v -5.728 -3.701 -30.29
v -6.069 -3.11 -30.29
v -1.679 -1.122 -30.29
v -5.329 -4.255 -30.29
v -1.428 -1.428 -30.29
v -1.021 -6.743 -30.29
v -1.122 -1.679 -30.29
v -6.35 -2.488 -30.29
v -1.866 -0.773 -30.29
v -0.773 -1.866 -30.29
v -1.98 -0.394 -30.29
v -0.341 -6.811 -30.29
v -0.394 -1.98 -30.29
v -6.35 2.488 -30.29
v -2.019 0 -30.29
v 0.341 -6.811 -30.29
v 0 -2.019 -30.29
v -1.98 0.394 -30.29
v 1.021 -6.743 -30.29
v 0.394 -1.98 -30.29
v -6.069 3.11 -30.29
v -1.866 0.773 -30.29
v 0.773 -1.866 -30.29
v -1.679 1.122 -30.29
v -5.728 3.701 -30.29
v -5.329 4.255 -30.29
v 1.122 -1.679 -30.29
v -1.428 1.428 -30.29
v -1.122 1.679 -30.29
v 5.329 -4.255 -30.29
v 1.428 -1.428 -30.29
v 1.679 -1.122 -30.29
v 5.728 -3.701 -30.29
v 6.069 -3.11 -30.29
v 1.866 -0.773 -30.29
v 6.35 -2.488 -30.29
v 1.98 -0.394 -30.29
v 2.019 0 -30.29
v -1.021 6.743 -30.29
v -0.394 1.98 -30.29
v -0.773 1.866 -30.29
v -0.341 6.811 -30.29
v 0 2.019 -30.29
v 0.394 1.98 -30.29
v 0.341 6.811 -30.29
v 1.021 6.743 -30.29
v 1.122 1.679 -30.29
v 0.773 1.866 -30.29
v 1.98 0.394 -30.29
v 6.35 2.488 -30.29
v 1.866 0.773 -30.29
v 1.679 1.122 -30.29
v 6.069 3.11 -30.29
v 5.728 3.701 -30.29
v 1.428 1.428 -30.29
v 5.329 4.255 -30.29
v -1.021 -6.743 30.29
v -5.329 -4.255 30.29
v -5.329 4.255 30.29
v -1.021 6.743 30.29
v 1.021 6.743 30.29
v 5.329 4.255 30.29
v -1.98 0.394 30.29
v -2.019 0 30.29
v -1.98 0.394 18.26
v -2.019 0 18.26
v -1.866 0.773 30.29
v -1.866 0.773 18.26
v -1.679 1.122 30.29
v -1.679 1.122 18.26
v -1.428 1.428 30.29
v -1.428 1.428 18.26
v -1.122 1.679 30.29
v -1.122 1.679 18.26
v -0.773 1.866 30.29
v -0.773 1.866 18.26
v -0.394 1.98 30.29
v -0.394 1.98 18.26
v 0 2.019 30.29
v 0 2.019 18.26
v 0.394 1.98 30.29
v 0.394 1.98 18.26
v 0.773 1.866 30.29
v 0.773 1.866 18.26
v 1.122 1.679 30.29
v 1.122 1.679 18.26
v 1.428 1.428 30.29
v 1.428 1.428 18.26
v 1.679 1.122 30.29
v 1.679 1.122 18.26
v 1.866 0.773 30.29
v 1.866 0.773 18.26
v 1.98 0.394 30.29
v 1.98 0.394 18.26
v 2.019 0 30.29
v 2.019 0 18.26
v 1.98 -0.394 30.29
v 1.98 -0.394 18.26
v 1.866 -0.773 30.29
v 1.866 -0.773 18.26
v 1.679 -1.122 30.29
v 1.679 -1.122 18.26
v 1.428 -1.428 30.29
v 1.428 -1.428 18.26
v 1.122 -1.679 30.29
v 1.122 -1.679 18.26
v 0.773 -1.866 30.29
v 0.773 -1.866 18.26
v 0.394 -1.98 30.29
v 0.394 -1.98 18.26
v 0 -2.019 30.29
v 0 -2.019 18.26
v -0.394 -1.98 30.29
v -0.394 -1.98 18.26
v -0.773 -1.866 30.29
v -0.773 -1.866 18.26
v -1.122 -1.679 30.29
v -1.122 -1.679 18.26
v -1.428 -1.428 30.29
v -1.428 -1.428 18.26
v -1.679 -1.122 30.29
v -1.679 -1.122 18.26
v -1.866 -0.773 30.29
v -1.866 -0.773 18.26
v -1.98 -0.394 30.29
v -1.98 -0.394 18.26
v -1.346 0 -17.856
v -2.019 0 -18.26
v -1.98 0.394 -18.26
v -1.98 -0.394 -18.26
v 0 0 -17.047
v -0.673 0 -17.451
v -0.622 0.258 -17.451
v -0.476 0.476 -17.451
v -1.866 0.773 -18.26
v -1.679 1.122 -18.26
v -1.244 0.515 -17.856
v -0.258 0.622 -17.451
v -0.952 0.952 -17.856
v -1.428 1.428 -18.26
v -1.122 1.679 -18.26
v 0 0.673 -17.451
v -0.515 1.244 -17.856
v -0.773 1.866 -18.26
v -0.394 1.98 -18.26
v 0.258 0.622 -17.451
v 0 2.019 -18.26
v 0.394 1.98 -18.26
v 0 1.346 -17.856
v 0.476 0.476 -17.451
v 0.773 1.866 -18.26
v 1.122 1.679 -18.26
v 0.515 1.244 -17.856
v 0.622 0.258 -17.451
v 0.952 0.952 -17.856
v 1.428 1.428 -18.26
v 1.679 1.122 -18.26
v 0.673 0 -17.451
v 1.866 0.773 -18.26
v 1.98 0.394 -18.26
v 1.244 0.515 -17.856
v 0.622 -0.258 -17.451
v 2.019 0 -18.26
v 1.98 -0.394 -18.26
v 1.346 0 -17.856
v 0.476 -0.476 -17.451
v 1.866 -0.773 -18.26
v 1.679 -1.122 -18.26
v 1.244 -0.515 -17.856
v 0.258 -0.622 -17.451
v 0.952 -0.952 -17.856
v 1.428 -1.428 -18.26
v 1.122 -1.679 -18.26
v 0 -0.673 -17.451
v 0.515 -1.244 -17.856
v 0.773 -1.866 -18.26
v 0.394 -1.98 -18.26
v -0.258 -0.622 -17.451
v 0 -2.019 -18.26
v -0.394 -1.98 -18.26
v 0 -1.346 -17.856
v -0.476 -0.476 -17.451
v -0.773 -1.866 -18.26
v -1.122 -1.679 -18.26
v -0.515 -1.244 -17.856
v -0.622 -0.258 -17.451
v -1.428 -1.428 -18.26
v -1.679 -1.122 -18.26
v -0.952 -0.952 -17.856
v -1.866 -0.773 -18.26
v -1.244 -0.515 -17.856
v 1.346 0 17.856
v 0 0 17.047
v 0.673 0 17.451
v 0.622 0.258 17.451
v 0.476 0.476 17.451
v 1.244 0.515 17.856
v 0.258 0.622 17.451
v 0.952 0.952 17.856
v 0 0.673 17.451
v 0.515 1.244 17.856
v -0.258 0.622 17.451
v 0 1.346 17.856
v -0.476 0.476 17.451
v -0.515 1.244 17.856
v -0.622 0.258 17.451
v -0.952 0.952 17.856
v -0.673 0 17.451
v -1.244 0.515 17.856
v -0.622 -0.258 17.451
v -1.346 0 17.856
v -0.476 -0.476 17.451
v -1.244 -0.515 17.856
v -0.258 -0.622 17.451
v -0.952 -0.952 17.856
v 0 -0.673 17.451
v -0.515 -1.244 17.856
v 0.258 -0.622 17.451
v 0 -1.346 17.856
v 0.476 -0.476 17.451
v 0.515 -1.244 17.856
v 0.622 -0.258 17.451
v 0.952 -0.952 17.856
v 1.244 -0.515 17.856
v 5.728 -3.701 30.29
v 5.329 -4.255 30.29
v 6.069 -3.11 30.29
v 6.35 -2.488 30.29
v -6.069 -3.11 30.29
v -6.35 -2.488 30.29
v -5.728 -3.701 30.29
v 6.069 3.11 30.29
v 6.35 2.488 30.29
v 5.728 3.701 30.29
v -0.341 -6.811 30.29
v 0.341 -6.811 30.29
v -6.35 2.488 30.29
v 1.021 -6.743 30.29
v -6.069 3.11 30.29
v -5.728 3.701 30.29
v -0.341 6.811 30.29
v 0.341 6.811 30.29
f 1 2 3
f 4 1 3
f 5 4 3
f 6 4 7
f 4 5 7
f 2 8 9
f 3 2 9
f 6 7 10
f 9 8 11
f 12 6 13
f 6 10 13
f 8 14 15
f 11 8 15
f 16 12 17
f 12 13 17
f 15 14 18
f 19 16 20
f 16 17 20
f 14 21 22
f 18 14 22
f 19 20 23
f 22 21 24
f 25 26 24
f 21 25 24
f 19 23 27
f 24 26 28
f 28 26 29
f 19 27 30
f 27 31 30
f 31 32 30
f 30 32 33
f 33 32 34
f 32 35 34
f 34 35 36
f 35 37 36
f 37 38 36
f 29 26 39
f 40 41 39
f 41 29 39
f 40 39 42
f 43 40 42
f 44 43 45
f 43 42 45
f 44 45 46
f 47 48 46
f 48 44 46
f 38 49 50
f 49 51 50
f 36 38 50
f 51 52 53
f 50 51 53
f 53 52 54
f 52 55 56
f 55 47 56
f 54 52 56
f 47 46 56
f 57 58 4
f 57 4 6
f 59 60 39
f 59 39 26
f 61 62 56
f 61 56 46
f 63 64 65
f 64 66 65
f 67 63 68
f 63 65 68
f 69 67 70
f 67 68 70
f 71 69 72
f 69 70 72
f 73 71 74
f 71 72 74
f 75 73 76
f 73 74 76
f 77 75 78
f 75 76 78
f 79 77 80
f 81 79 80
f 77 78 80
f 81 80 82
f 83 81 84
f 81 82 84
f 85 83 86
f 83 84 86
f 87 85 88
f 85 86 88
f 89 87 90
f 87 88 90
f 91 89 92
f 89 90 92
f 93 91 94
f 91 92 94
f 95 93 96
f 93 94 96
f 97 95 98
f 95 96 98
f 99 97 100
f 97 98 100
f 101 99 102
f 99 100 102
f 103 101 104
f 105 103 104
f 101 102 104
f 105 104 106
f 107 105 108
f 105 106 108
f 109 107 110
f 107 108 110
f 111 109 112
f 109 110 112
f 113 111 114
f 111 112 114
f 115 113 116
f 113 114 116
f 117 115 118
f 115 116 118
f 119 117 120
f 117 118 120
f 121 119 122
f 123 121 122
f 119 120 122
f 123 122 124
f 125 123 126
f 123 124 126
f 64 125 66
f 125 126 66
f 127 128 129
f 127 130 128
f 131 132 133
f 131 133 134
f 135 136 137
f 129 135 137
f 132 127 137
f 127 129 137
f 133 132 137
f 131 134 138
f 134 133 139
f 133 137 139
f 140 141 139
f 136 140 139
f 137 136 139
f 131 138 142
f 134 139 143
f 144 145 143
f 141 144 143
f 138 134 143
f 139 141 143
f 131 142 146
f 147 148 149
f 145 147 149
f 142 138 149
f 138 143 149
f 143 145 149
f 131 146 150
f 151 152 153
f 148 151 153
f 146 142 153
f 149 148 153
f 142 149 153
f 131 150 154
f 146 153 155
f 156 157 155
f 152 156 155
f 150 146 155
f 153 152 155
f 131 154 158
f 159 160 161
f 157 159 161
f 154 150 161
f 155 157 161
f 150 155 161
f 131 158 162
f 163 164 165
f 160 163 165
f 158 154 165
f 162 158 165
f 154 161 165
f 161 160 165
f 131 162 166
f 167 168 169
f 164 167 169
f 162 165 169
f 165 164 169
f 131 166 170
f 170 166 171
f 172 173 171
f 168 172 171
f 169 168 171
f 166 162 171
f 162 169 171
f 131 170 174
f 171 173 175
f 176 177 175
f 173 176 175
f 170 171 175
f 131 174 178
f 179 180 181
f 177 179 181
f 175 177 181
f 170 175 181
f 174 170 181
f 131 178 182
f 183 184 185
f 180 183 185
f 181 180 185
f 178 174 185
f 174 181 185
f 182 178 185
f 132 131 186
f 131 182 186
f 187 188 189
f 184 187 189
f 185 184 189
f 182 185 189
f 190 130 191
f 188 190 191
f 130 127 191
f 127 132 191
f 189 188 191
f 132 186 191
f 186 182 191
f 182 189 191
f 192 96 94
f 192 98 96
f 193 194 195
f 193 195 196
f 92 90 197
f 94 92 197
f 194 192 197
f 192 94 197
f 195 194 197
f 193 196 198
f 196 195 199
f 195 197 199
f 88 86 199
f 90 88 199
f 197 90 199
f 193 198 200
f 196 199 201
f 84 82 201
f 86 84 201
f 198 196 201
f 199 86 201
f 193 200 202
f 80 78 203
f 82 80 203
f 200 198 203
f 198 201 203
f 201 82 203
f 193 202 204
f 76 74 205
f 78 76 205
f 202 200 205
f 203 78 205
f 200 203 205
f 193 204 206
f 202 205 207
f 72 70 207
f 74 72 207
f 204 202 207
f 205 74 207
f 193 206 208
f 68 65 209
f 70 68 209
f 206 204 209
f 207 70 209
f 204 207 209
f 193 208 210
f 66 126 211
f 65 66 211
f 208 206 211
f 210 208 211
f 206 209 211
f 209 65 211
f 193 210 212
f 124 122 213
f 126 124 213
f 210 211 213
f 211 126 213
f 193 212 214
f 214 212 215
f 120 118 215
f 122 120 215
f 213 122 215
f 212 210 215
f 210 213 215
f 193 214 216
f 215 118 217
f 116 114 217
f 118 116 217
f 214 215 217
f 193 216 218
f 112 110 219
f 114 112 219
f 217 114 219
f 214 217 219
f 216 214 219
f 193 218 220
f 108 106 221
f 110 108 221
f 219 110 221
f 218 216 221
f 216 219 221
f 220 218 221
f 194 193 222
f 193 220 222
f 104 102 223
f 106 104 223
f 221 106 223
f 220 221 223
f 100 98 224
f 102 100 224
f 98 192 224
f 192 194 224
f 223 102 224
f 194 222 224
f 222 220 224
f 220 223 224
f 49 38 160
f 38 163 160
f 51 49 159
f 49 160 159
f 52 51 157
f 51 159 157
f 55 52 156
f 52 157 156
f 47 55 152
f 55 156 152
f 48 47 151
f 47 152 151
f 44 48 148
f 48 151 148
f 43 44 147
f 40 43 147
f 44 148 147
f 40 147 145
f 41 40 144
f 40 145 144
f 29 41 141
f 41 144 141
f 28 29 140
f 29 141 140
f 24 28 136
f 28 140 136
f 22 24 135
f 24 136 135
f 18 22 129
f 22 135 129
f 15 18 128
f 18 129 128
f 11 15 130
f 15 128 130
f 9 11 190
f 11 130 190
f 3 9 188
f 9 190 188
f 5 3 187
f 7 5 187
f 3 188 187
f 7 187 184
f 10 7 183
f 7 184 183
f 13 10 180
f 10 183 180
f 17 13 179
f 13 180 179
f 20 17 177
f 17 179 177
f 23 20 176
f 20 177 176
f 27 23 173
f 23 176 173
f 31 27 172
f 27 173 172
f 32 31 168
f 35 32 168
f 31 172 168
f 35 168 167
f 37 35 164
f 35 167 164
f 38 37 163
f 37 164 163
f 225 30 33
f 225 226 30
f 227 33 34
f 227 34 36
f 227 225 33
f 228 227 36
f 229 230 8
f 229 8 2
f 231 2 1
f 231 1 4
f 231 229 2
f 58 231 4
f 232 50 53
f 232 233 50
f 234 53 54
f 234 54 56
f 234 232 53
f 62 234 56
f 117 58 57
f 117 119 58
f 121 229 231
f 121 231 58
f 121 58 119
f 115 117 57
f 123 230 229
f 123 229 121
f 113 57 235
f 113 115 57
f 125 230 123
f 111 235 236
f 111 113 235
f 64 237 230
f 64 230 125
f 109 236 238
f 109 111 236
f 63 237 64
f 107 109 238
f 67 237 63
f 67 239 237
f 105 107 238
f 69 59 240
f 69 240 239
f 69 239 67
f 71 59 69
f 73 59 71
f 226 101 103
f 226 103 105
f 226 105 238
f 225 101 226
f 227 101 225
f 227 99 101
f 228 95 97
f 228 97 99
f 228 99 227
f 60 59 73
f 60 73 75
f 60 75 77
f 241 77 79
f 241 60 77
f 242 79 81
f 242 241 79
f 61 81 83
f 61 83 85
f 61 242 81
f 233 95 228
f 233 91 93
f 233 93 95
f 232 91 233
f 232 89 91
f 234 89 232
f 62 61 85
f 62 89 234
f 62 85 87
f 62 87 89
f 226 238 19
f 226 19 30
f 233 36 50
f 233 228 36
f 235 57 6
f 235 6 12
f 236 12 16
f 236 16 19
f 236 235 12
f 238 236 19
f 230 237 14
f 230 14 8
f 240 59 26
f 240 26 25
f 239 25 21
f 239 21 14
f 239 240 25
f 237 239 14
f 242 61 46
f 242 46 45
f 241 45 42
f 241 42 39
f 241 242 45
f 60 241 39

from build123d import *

# Parameters (mm, degrees)
BOSS_EXTRUDE1_DEPTH        = 30.2895
F_10_32_TAPPED_HOLE1_D     = 4.0386
F_10_32_TAPPED_HOLE1_DEPTH = 12.02944
F_10_32_TAPPED_HOLE1_TIP   = 1.213317848
F_10_32_TAPPED_HOLE2_D     = 4.0386
F_10_32_TAPPED_HOLE2_DEPTH = 12.02944
F_10_32_TAPPED_HOLE2_TIP   = 1.213317848


with BuildPart() as part:
    # Sketch1 → Boss-Extrude1 (new, symmetric)
    with BuildSketch(Plane.XY):
        with BuildLine():
            ThreePointArc((6.35, 2.48767683), (5.906206651, 3.40995), (5.329391331, 4.255422899))
            Line((5.329391331, 4.255422899), (1.020608669, 6.743099729))
            ThreePointArc((1.020608669, 6.743099729), (0, 6.8199), (-1.020608669, 6.743099729))
            Line((-1.020608669, 6.743099729), (-5.329391331, 4.255422899))
            ThreePointArc((-5.329391331, 4.255422899), (-5.906206651, 3.40995), (-6.35, 2.48767683))
            Line((-6.35, 2.48767683), (-6.35, -2.48767683))
            ThreePointArc((-6.35, -2.48767683), (-5.906206651, -3.40995), (-5.329391331, -4.255422899))
            Line((-5.329391331, -4.255422899), (-1.020608669, -6.743099729))
            ThreePointArc((-1.020608669, -6.743099729), (0, -6.8199), (1.020608669, -6.743099729))
            Line((1.020608669, -6.743099729), (5.329391331, -4.255422899))
            ThreePointArc((5.329391331, -4.255422899), (5.906206651, -3.40995), (6.35, -2.48767683))
            Line((6.35, -2.48767683), (6.35, 2.48767683))
        make_face()
    extrude(amount=BOSS_EXTRUDE1_DEPTH, both=True)

    # #10-32 Tapped Hole1
    with Locations(Plane.XY.offset(30.2895)):
        with Locations((0, 0)):
            Hole(F_10_32_TAPPED_HOLE1_D / 2, depth=F_10_32_TAPPED_HOLE1_DEPTH)
            with Locations((0, 0, -(F_10_32_TAPPED_HOLE1_DEPTH + F_10_32_TAPPED_HOLE1_TIP / 2))):  # 118° drill point
                Cone(0, F_10_32_TAPPED_HOLE1_D / 2, F_10_32_TAPPED_HOLE1_TIP, mode=Mode.SUBTRACT)

    # #10-32 Tapped Hole2
    with Locations(Plane(origin=(0, 0, -30.2895), x_dir=(-1, 0, 0), z_dir=(0, 0, -1))):
        with Locations((0, 0)):
            Hole(F_10_32_TAPPED_HOLE2_D / 2, depth=F_10_32_TAPPED_HOLE2_DEPTH)
            with Locations((0, 0, -(F_10_32_TAPPED_HOLE2_DEPTH + F_10_32_TAPPED_HOLE2_TIP / 2))):  # 118° drill point
                Cone(0, F_10_32_TAPPED_HOLE2_D / 2, F_10_32_TAPPED_HOLE2_TIP, mode=Mode.SUBTRACT)


solid = part.part
